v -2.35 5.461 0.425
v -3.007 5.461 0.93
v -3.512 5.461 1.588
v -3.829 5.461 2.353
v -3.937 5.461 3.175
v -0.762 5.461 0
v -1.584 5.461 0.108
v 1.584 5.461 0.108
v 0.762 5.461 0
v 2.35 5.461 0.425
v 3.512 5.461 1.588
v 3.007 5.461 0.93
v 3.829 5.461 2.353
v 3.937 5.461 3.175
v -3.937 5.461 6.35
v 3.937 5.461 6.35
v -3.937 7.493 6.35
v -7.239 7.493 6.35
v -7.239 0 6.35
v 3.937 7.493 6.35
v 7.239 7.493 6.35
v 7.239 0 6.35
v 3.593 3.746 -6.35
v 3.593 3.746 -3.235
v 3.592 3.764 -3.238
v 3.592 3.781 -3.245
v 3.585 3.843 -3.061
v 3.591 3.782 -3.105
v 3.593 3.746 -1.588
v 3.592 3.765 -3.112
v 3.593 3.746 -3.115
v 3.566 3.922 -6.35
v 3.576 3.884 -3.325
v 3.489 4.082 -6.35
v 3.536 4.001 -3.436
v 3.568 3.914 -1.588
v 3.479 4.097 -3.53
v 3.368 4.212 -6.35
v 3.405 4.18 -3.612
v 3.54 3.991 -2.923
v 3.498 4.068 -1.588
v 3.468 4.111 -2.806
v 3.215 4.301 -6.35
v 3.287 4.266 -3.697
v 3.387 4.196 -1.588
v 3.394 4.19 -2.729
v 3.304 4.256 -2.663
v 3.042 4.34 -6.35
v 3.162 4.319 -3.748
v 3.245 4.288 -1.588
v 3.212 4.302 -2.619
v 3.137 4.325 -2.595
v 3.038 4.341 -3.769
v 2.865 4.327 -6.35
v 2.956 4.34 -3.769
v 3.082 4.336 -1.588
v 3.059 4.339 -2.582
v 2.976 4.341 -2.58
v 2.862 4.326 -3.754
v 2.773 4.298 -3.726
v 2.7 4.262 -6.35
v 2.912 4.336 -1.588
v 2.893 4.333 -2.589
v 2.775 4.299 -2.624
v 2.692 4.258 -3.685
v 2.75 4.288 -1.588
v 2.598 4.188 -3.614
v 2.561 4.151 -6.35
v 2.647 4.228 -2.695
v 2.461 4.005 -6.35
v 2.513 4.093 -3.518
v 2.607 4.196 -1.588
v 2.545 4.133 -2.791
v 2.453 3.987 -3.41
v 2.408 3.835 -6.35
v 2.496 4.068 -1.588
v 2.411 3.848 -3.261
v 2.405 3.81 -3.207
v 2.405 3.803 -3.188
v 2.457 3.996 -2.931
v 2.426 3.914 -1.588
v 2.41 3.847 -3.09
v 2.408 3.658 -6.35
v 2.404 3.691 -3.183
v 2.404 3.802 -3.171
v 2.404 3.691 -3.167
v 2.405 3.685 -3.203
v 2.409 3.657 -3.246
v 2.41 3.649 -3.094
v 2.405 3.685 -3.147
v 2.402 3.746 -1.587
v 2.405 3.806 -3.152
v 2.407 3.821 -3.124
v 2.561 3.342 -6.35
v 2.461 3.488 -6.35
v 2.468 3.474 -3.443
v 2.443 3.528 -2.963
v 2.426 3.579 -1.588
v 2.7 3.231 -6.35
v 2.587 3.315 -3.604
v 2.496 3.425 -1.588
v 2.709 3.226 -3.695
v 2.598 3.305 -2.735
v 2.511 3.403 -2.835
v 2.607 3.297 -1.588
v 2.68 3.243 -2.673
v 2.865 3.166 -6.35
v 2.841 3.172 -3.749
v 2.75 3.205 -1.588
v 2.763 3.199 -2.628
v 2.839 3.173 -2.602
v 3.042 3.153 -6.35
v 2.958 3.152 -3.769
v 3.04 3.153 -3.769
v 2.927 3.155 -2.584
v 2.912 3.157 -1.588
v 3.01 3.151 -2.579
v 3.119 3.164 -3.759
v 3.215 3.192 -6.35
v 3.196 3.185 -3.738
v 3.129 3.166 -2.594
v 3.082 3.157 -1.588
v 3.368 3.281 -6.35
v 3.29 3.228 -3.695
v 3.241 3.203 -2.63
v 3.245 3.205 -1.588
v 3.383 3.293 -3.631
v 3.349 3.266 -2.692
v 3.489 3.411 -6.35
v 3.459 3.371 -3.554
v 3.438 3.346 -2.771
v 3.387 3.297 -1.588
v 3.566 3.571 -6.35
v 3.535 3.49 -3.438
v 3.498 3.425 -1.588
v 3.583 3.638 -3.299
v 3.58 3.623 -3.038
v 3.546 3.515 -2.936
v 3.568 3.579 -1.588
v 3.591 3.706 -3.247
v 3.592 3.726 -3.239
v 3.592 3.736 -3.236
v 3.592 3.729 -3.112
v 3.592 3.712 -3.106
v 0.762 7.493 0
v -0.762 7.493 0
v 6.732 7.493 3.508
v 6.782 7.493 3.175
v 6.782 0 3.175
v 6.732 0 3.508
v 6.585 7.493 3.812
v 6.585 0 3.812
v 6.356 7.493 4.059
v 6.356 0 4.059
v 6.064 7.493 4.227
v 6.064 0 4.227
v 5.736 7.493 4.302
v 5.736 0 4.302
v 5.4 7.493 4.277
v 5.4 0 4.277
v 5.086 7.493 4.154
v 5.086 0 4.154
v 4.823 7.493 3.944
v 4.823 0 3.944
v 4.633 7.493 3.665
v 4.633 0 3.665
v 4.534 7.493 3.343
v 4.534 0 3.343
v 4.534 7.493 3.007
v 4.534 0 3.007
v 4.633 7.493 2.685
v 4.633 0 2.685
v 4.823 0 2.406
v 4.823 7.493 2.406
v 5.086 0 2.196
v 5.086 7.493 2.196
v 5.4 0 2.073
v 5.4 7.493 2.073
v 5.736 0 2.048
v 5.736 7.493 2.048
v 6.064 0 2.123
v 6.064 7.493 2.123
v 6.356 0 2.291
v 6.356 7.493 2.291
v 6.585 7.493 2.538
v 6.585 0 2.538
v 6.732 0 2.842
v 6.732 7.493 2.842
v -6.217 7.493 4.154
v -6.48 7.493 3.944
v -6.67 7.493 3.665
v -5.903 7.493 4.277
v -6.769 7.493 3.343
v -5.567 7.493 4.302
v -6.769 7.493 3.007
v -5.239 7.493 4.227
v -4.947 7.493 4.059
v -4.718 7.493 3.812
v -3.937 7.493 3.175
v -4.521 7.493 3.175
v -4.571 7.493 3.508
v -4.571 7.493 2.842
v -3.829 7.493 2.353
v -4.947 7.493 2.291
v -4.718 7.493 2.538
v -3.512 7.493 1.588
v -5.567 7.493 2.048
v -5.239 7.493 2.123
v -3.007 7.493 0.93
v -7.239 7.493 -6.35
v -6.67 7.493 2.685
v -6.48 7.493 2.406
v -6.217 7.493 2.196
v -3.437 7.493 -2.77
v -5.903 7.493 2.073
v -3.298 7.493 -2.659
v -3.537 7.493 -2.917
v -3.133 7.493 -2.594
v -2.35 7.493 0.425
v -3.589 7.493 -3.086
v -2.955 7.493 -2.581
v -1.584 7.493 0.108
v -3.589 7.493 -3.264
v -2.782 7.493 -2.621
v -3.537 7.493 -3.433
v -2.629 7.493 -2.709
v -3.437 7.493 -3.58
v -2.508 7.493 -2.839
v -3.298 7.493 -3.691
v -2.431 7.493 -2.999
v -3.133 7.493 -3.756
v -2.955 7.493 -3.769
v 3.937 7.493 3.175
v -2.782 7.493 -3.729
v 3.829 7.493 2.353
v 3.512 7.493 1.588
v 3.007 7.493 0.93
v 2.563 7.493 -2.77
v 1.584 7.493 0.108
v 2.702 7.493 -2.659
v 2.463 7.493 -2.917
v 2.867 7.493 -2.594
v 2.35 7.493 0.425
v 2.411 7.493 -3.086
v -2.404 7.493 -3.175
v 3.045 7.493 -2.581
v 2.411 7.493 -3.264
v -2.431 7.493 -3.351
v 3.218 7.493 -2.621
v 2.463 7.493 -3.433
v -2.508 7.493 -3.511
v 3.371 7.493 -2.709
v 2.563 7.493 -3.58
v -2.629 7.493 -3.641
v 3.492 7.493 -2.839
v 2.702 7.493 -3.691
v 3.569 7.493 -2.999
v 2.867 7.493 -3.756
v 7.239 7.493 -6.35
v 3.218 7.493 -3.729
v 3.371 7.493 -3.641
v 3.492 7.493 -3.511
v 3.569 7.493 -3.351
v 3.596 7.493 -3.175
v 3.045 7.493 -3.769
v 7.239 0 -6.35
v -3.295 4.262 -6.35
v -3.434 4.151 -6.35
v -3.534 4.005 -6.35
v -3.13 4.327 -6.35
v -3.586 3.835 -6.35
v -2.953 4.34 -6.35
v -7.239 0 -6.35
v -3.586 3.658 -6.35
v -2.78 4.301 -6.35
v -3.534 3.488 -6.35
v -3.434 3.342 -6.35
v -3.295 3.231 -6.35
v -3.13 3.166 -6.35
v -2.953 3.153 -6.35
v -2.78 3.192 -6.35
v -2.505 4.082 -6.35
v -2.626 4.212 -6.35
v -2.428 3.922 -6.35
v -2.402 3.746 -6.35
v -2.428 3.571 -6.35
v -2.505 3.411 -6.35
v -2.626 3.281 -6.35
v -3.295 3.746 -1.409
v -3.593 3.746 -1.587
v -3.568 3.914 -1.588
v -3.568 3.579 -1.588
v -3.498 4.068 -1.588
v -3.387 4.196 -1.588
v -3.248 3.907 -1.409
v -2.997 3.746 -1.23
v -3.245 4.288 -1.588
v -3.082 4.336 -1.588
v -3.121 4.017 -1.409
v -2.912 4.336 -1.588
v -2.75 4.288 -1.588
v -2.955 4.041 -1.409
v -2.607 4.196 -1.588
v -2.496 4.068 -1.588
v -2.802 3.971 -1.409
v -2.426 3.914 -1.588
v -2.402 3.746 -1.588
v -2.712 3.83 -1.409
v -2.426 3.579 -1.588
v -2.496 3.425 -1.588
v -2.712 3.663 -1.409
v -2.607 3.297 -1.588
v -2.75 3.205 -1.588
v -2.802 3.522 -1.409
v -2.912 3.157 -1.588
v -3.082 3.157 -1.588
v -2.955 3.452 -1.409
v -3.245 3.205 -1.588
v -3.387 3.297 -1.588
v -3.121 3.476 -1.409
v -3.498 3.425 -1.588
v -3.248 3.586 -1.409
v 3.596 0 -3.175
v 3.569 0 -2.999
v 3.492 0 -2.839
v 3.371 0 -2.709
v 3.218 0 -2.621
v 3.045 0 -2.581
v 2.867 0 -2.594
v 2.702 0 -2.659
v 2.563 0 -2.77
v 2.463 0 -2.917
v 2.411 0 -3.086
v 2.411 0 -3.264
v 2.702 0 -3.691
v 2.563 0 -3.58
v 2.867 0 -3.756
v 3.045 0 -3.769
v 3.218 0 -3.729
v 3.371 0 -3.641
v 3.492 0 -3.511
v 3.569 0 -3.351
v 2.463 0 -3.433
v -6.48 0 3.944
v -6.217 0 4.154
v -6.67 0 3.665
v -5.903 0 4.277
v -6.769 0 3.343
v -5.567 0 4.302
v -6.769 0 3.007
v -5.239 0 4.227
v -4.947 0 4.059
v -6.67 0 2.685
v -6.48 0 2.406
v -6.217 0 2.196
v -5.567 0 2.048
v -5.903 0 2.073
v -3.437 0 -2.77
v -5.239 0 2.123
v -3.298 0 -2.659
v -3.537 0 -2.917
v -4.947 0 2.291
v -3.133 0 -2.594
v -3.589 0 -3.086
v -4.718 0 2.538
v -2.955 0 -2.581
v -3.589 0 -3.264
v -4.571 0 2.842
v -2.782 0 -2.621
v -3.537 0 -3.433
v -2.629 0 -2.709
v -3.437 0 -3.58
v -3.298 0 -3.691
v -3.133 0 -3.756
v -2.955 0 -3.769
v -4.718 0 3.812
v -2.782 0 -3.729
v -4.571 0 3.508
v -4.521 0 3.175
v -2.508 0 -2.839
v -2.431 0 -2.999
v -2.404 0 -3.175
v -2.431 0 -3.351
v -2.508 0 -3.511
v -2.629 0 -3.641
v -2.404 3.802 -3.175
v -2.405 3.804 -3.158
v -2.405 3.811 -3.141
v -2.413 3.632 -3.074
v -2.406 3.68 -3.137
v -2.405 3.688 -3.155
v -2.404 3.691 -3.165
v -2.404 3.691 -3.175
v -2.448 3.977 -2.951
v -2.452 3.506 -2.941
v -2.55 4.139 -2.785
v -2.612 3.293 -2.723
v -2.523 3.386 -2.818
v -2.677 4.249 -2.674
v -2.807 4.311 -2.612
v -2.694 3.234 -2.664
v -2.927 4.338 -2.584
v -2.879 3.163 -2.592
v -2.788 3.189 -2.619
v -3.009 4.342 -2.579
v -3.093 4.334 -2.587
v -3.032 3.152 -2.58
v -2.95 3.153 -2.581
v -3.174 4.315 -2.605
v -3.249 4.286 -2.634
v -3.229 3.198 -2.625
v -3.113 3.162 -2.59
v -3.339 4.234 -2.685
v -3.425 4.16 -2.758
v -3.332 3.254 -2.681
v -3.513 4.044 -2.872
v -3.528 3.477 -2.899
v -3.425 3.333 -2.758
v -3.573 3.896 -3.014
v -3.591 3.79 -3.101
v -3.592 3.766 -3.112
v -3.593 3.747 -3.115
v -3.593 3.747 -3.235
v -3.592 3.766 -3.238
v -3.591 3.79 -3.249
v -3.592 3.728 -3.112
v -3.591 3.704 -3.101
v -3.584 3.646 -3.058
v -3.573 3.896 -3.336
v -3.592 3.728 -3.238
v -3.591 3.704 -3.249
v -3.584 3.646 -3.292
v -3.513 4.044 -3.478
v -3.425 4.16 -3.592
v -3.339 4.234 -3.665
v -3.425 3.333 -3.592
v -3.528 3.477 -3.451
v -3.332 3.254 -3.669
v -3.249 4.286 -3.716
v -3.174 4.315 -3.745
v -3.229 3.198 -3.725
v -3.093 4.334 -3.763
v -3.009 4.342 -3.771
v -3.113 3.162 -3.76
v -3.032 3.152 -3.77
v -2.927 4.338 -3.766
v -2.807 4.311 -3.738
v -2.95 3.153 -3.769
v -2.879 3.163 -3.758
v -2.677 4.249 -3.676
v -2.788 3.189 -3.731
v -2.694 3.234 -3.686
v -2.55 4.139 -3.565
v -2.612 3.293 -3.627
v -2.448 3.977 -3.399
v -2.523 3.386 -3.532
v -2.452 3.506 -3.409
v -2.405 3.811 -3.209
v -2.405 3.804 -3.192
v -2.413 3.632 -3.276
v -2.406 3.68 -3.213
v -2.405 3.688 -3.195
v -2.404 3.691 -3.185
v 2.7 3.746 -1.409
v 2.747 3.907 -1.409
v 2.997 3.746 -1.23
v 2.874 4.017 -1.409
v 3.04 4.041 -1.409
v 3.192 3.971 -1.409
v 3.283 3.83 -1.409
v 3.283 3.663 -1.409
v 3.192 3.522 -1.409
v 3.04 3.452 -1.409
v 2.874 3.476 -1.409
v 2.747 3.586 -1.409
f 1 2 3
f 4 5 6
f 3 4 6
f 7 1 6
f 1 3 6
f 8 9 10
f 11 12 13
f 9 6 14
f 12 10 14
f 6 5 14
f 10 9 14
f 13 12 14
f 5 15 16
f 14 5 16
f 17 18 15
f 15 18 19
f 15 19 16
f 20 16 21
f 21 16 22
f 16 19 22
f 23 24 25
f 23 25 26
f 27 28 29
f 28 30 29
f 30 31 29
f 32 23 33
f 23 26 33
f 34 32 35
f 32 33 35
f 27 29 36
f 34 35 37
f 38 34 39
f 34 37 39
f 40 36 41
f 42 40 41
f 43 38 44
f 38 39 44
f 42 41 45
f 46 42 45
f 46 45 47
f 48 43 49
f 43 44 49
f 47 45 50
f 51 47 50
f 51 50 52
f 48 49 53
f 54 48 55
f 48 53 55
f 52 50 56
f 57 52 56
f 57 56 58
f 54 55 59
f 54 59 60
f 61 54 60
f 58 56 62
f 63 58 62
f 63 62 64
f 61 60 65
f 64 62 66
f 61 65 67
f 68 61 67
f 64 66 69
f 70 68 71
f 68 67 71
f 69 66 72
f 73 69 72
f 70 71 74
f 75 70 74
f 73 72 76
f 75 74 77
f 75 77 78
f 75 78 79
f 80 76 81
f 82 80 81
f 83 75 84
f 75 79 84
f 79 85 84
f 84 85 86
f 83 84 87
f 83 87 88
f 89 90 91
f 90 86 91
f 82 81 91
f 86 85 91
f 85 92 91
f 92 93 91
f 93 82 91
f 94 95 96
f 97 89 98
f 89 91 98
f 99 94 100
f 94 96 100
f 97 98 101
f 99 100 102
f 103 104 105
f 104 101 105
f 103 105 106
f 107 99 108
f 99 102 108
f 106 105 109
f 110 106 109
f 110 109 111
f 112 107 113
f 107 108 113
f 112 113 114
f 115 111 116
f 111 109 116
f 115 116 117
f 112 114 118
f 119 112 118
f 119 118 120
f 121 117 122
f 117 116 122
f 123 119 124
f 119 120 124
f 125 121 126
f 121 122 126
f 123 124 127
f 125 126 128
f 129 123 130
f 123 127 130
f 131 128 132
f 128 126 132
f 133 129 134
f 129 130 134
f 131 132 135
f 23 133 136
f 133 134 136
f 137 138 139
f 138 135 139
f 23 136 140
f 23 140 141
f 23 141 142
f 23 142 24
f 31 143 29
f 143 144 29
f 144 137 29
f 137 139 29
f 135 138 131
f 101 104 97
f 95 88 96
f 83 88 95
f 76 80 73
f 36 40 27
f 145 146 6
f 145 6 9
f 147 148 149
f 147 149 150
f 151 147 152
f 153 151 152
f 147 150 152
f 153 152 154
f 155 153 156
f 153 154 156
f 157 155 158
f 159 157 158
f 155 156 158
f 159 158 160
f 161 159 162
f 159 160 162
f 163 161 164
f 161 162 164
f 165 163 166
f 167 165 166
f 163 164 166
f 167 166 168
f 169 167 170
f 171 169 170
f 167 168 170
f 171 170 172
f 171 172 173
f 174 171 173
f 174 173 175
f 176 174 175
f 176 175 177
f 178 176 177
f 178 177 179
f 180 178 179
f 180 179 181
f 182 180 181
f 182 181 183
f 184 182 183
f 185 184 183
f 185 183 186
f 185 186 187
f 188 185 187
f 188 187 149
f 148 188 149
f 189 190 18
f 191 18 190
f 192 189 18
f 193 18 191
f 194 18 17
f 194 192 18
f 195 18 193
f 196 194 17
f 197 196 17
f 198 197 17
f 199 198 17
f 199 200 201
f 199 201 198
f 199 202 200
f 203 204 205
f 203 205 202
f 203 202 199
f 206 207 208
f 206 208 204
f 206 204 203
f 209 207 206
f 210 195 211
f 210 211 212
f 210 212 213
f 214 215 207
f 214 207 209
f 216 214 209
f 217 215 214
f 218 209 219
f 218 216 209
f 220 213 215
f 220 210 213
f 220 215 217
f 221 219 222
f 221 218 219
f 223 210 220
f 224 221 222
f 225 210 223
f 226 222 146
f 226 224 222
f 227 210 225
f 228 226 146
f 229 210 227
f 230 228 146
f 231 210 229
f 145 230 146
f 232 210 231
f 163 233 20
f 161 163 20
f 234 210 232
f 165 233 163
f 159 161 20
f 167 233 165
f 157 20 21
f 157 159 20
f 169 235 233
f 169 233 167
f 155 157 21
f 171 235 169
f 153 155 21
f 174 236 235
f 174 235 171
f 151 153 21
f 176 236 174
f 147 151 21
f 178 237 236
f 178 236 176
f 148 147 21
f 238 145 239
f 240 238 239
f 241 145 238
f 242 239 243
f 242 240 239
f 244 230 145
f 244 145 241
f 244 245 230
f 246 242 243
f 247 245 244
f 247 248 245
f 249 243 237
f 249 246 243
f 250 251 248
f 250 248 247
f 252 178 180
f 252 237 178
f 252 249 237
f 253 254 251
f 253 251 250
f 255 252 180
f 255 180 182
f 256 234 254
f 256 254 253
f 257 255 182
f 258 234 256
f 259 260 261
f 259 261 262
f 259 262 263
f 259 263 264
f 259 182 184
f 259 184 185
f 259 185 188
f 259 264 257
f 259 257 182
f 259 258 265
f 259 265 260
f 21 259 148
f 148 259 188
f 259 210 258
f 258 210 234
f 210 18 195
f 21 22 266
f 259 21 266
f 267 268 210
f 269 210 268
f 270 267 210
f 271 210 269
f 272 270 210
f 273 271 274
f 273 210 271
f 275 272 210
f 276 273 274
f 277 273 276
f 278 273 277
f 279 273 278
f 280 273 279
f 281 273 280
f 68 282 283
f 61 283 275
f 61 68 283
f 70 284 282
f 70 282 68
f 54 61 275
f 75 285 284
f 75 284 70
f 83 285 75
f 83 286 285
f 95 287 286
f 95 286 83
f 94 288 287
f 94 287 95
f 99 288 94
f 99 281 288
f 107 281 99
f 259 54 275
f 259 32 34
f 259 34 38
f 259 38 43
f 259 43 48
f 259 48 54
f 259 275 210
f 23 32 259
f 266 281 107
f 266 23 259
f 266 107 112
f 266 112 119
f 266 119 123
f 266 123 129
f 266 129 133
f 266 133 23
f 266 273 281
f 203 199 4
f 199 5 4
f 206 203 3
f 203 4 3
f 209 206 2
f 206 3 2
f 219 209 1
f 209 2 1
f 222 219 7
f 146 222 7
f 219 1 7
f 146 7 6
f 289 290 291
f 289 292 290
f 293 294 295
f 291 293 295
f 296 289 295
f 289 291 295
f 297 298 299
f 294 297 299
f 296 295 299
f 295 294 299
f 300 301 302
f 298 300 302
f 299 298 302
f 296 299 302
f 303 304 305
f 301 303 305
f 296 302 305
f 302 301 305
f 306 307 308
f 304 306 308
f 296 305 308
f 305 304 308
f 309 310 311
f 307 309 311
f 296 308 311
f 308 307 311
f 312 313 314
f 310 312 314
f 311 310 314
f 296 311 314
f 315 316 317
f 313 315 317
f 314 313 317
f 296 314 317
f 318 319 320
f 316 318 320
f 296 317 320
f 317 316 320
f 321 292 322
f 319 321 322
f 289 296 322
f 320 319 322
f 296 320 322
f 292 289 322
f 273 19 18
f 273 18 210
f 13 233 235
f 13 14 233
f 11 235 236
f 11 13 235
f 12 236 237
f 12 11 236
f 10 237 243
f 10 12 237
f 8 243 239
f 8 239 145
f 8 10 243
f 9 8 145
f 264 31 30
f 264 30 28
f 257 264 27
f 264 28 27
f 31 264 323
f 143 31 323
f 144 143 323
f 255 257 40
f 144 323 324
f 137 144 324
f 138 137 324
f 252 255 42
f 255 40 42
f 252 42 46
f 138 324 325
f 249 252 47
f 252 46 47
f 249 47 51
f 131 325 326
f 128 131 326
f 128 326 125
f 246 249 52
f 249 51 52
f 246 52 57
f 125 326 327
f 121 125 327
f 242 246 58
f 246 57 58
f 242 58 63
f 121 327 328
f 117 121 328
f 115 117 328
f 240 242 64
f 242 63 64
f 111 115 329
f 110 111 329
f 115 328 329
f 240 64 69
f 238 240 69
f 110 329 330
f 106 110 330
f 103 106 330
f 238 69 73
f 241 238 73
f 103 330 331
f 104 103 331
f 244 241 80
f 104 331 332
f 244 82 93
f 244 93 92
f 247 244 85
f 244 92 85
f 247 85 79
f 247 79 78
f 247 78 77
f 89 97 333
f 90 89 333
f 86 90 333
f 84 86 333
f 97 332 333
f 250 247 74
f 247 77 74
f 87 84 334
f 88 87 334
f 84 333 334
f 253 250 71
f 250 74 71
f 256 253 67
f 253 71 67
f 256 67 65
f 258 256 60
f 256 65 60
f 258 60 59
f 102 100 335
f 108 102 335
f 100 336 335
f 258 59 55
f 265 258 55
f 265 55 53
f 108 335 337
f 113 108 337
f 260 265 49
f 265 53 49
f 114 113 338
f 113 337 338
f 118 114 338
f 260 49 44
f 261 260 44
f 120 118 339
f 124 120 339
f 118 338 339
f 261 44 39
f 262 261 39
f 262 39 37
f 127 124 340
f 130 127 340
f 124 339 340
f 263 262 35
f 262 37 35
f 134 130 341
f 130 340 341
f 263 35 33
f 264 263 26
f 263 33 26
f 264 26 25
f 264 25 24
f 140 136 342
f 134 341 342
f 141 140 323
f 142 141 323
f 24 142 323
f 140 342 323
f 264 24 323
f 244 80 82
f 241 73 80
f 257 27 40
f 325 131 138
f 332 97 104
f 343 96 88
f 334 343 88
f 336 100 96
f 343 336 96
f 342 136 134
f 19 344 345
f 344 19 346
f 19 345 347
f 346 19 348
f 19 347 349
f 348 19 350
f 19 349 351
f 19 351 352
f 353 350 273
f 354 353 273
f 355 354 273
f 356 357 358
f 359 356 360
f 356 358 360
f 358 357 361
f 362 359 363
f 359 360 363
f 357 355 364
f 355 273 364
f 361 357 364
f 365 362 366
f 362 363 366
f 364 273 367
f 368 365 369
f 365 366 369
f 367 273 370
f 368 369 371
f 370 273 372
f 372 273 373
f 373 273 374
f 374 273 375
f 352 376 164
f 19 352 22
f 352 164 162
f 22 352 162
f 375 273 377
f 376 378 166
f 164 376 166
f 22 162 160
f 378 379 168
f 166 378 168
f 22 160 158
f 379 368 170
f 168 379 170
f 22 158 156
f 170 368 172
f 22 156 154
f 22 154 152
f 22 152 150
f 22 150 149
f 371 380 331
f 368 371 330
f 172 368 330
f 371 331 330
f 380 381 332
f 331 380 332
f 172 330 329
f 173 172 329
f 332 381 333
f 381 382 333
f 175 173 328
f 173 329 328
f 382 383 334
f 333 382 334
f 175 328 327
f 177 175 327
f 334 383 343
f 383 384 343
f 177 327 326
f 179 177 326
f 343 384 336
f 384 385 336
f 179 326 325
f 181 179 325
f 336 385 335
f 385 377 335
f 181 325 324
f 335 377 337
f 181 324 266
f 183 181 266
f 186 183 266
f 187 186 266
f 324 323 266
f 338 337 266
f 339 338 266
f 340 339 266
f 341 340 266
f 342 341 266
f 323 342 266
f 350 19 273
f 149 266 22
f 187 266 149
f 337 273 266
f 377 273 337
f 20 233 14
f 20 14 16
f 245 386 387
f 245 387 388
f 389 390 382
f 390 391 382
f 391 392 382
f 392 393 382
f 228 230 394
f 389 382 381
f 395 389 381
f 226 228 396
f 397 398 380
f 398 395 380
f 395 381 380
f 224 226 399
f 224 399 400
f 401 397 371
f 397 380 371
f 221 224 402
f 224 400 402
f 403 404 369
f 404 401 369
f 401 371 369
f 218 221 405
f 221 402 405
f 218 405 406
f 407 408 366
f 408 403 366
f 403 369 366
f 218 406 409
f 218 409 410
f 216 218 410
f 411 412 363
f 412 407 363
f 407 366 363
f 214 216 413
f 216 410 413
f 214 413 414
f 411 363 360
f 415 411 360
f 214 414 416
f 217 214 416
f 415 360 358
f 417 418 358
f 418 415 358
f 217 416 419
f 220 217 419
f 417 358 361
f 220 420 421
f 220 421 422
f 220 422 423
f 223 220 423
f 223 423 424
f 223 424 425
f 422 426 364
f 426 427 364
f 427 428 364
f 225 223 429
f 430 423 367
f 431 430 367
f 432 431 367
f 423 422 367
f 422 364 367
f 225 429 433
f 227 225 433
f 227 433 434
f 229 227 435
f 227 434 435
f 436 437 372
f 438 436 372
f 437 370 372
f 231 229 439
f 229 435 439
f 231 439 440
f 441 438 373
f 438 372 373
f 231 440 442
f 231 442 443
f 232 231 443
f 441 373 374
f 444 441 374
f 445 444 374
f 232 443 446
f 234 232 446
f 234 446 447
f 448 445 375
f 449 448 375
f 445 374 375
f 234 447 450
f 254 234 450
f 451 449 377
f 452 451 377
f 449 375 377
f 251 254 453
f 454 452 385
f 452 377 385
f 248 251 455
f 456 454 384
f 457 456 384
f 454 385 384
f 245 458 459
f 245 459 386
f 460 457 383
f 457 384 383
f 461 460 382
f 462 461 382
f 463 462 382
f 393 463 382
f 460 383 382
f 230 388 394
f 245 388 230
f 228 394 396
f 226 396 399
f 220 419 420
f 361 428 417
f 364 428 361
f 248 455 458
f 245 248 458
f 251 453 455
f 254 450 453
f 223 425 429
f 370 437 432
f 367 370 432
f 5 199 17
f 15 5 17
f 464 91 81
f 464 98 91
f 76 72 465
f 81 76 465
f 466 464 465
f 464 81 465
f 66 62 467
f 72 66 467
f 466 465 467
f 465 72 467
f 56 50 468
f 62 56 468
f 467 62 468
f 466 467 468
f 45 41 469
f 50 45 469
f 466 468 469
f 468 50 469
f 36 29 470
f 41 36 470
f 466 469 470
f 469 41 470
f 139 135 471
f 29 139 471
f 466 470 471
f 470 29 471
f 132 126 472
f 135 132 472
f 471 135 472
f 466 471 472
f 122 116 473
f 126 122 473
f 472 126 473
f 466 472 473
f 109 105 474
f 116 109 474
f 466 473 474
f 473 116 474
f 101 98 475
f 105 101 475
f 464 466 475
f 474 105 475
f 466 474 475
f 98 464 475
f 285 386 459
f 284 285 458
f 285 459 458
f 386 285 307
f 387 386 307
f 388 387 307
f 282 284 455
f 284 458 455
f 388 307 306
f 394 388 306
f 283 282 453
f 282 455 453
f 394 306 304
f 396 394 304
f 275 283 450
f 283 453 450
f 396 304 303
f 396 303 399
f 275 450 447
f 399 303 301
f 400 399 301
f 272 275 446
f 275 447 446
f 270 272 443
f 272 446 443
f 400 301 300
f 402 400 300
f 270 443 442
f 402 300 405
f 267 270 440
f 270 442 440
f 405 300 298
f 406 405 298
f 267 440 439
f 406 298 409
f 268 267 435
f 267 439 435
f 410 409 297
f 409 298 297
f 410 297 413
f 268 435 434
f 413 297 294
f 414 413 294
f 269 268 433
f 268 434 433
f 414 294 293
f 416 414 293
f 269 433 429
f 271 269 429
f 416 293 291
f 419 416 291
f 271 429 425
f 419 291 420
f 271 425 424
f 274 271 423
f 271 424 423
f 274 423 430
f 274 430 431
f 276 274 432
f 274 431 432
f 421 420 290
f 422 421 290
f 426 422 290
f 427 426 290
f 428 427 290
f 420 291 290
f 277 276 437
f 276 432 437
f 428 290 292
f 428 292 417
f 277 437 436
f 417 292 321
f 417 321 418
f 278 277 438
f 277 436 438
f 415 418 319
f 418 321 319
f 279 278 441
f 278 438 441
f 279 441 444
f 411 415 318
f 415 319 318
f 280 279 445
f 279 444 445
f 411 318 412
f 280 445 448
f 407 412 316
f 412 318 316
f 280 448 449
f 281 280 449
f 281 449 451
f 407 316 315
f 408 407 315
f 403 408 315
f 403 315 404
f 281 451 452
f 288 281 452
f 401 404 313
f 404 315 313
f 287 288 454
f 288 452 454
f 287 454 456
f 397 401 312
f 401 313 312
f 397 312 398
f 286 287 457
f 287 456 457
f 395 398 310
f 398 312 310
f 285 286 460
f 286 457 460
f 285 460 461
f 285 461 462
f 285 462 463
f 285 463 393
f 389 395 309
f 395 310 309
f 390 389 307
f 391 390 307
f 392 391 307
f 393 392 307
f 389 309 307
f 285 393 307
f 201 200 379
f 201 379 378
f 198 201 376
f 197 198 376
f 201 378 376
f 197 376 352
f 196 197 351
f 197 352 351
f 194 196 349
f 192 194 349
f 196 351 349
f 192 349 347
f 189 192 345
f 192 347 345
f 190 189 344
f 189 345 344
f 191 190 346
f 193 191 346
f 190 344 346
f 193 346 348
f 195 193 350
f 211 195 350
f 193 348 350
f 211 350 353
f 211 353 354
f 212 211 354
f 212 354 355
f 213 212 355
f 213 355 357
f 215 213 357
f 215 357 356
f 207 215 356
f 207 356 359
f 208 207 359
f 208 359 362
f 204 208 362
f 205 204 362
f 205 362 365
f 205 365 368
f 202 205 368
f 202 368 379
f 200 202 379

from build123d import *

# Parameters (mm, degrees)
SKETCH1_W                           = 14.478
SKETCH1_H                           = 12.7
BOSS_EXTRUDE1_DEPTH                 = 7.493
F_0_80_TAPPED_HOLE1_D               = 1.19126
F_2_CLEARANCE_HOLE1_D               = 2.2606
F_3_64_0_04688_DIAMETER_HOLE1_D     = 1.190752
F_3_64_0_04688_DIAMETER_HOLE1_DEPTH = 4.7625
F_3_64_0_04688_DIAMETER_HOLE1_TIP   = 0.357737992
SKETCH8_W                           = 7.874
SKETCH8_H                           = 12.7
CUT_EXTRUDE1_DEPTH                  = 2.032
FILLET1_R                           = 3.175


with BuildPart() as part:
    # Sketch1 → Boss-Extrude1 (new body)
    with BuildSketch(Plane(origin=(0, 0, 0), x_dir=(1, 0, 0), z_dir=(0, 1, 0))):
        Rectangle(SKETCH1_W, SKETCH1_H)
    extrude(amount=BOSS_EXTRUDE1_DEPTH)

    # #0-80 Tapped Hole1 (through all)
    with Locations(Plane(origin=(0, 7.493, 0), x_dir=(-1, 0, 0), z_dir=(0, 1, 0))):
        with Locations((3, -3.175), (-3, -3.175)):
            Hole(F_0_80_TAPPED_HOLE1_D / 2)

    # #2 Clearance Hole1 (through all)
    with Locations(Plane(origin=(0, 7.493, 0), x_dir=(-1, 0, 0), z_dir=(0, 1, 0))):
        with Locations((5.6515, 3.175), (-5.6515, 3.175)):
            Hole(F_2_CLEARANCE_HOLE1_D / 2)

    # 3/64 (0.04688) Diameter Hole1
    with Locations(Plane(origin=(0, 0, -6.35), x_dir=(-1, 0, 0), z_dir=(0, 0, -1))):
        with Locations((-2.9972, 3.7465), (2.9972, 3.7465)):
            Hole(F_3_64_0_04688_DIAMETER_HOLE1_D / 2, depth=F_3_64_0_04688_DIAMETER_HOLE1_DEPTH)
            with Locations((0, 0, -(F_3_64_0_04688_DIAMETER_HOLE1_DEPTH + F_3_64_0_04688_DIAMETER_HOLE1_TIP / 2))):  # 118° drill point
                Cone(0, F_3_64_0_04688_DIAMETER_HOLE1_D / 2, F_3_64_0_04688_DIAMETER_HOLE1_TIP, mode=Mode.SUBTRACT)

    # Sketch8 → Cut-Extrude1 (cut)
    with BuildSketch(Plane.XZ.offset(-7.493)):
        with Locations((0, 6.35)):
            Rectangle(SKETCH8_W, SKETCH8_H)
    extrude(amount=CUT_EXTRUDE1_DEPTH, mode=Mode.SUBTRACT)

    # Fillet1
    fillet1_edges = [part.edges().sort_by_distance(p)[0] for p in [
        (3.937, 6.477, 0),
        (-3.937, 6.477, 0),
    ]]
    fillet(fillet1_edges, radius=FILLET1_R)


solid = part.part
